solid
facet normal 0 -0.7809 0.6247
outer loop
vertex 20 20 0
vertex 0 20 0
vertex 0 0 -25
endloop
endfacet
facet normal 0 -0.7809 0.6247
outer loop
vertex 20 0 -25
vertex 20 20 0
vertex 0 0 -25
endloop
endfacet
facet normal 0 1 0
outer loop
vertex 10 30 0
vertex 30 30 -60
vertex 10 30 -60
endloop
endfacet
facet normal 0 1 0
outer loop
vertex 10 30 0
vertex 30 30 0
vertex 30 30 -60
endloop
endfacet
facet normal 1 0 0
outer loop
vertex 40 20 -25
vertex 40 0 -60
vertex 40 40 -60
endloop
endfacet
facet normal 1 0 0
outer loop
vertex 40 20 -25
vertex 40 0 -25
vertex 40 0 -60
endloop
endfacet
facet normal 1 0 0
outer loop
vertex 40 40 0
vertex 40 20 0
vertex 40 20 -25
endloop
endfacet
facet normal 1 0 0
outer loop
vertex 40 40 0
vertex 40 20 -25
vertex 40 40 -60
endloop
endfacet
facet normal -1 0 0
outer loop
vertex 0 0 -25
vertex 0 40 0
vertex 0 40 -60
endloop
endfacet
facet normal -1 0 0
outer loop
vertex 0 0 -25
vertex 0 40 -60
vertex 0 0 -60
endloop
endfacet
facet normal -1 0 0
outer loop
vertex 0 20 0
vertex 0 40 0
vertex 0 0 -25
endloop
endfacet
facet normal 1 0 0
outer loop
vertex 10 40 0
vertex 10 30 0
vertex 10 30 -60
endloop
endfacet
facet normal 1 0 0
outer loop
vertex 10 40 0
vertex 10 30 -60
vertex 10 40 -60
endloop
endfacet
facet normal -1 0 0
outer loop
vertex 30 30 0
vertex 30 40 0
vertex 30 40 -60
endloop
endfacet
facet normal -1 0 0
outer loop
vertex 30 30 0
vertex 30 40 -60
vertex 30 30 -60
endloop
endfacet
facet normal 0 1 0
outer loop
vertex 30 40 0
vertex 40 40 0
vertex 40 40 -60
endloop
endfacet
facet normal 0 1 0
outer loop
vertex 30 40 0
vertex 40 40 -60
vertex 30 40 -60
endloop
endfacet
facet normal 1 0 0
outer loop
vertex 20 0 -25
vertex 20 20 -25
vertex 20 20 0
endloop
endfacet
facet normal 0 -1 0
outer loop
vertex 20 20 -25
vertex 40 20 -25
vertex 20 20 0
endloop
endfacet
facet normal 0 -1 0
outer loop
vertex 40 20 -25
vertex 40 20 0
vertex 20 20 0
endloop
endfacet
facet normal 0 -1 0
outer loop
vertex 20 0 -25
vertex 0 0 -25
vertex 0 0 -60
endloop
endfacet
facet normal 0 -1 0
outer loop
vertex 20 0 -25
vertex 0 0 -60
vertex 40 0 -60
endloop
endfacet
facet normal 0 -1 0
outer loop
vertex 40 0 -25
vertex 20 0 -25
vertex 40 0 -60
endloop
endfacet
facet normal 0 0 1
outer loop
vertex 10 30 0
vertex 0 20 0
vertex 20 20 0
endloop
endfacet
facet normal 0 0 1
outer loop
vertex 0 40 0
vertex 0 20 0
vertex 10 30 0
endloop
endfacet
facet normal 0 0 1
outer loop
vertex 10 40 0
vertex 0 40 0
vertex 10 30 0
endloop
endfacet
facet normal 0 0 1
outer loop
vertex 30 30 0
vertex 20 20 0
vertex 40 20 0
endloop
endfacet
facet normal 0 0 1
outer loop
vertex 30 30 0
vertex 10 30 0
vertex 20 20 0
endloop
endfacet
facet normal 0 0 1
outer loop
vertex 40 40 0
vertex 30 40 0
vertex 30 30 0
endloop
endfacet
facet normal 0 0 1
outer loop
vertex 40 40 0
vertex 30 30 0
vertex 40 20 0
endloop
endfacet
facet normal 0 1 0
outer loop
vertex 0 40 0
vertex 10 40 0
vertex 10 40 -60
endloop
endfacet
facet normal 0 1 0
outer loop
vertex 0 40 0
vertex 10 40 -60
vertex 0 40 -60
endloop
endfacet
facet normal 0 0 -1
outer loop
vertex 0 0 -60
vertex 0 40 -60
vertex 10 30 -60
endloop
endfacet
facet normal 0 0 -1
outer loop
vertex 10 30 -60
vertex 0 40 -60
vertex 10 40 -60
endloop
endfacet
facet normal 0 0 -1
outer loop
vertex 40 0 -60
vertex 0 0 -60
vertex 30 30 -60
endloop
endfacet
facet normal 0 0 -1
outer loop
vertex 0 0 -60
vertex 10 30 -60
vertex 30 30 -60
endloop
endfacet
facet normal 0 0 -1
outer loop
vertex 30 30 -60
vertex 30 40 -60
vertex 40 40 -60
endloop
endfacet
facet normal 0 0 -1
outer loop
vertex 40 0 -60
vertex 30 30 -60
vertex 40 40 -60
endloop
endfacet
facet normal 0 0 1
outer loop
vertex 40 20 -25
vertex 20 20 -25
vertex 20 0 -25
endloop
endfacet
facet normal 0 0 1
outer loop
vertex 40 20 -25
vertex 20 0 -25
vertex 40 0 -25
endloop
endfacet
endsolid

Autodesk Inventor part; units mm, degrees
ref_plane "YZ Plane" through (0, 0, 0) normal (1, 0, 0) x (0, 1, 0)
ref_plane "XZ Plane" through (0, 0, 0) normal (0, 1, 0) x (-1, 0, 0)
ref_plane "XY Plane" through (0, 0, 0) normal (0, 0, 1) x (1, 0, 0)
sketch "Náčrt1" plane through (0, 0, 0) normal (0, 0, 1) x (1, 0, 0)
  line L0 (0, 0) -> (40, 0)
  line L1 (40, 0) -> (40, 40)
  line L2 (40, 40) -> (30, 40)
  line L3 (30, 40) -> (30, 30)
  line L4 (30, 30) -> (10, 30)
  line L5 (10, 30) -> (10, 40)
  line L6 (10, 40) -> (0, 40)
  line L7 (0, 40) -> (0, 0)
  dimension "d0" = 40
  dimension "d1" = 40
  dimension "d2" = 10
  dimension "d3" = 10
  dimension "d4" = 20
  dimension "d5" = 10
  dimension "d6" = 10
extrude "Vysunutí1" add sketch "Náčrt1" against normal blind 60
sketch "Náčrt2" plane through (0, 0, 0) normal (0, 0, 1) x (1, 0, 0)
  line L0 (40, 0) -> (0, 0) projected
  line L1 (40, 0) -> (40, 20)
  line L2 (40, 0) -> (40, 40) projected
  line L3 (40, 20) -> (20, 20)
  line L4 (20, 20) -> (20, 0)
  line L5 (20, 0) -> (40, 0)
  dimension "d11" = 20
  dimension "d12" = 20
extrude "Vysunutí2" cut sketch "Náčrt2" against normal blind 25
sketch "Náčrt3" plane through (0, 0, 0) normal (-1, 0, 0) x (0, 0, 1)
  line L0 (0, 40) -> (0, 0) projected
  line L1 (-25, 0) -> (0, 0) projected
  line L2 (0, 0) -> (-25, 0)
  line L3 (0, 20) -> (-25, 0)
  line L4 (0, 0) -> (0, 20)
extrude "Vysunutí3" cut sketch "Náčrt3" against normal blind 25
properties part number "5"
